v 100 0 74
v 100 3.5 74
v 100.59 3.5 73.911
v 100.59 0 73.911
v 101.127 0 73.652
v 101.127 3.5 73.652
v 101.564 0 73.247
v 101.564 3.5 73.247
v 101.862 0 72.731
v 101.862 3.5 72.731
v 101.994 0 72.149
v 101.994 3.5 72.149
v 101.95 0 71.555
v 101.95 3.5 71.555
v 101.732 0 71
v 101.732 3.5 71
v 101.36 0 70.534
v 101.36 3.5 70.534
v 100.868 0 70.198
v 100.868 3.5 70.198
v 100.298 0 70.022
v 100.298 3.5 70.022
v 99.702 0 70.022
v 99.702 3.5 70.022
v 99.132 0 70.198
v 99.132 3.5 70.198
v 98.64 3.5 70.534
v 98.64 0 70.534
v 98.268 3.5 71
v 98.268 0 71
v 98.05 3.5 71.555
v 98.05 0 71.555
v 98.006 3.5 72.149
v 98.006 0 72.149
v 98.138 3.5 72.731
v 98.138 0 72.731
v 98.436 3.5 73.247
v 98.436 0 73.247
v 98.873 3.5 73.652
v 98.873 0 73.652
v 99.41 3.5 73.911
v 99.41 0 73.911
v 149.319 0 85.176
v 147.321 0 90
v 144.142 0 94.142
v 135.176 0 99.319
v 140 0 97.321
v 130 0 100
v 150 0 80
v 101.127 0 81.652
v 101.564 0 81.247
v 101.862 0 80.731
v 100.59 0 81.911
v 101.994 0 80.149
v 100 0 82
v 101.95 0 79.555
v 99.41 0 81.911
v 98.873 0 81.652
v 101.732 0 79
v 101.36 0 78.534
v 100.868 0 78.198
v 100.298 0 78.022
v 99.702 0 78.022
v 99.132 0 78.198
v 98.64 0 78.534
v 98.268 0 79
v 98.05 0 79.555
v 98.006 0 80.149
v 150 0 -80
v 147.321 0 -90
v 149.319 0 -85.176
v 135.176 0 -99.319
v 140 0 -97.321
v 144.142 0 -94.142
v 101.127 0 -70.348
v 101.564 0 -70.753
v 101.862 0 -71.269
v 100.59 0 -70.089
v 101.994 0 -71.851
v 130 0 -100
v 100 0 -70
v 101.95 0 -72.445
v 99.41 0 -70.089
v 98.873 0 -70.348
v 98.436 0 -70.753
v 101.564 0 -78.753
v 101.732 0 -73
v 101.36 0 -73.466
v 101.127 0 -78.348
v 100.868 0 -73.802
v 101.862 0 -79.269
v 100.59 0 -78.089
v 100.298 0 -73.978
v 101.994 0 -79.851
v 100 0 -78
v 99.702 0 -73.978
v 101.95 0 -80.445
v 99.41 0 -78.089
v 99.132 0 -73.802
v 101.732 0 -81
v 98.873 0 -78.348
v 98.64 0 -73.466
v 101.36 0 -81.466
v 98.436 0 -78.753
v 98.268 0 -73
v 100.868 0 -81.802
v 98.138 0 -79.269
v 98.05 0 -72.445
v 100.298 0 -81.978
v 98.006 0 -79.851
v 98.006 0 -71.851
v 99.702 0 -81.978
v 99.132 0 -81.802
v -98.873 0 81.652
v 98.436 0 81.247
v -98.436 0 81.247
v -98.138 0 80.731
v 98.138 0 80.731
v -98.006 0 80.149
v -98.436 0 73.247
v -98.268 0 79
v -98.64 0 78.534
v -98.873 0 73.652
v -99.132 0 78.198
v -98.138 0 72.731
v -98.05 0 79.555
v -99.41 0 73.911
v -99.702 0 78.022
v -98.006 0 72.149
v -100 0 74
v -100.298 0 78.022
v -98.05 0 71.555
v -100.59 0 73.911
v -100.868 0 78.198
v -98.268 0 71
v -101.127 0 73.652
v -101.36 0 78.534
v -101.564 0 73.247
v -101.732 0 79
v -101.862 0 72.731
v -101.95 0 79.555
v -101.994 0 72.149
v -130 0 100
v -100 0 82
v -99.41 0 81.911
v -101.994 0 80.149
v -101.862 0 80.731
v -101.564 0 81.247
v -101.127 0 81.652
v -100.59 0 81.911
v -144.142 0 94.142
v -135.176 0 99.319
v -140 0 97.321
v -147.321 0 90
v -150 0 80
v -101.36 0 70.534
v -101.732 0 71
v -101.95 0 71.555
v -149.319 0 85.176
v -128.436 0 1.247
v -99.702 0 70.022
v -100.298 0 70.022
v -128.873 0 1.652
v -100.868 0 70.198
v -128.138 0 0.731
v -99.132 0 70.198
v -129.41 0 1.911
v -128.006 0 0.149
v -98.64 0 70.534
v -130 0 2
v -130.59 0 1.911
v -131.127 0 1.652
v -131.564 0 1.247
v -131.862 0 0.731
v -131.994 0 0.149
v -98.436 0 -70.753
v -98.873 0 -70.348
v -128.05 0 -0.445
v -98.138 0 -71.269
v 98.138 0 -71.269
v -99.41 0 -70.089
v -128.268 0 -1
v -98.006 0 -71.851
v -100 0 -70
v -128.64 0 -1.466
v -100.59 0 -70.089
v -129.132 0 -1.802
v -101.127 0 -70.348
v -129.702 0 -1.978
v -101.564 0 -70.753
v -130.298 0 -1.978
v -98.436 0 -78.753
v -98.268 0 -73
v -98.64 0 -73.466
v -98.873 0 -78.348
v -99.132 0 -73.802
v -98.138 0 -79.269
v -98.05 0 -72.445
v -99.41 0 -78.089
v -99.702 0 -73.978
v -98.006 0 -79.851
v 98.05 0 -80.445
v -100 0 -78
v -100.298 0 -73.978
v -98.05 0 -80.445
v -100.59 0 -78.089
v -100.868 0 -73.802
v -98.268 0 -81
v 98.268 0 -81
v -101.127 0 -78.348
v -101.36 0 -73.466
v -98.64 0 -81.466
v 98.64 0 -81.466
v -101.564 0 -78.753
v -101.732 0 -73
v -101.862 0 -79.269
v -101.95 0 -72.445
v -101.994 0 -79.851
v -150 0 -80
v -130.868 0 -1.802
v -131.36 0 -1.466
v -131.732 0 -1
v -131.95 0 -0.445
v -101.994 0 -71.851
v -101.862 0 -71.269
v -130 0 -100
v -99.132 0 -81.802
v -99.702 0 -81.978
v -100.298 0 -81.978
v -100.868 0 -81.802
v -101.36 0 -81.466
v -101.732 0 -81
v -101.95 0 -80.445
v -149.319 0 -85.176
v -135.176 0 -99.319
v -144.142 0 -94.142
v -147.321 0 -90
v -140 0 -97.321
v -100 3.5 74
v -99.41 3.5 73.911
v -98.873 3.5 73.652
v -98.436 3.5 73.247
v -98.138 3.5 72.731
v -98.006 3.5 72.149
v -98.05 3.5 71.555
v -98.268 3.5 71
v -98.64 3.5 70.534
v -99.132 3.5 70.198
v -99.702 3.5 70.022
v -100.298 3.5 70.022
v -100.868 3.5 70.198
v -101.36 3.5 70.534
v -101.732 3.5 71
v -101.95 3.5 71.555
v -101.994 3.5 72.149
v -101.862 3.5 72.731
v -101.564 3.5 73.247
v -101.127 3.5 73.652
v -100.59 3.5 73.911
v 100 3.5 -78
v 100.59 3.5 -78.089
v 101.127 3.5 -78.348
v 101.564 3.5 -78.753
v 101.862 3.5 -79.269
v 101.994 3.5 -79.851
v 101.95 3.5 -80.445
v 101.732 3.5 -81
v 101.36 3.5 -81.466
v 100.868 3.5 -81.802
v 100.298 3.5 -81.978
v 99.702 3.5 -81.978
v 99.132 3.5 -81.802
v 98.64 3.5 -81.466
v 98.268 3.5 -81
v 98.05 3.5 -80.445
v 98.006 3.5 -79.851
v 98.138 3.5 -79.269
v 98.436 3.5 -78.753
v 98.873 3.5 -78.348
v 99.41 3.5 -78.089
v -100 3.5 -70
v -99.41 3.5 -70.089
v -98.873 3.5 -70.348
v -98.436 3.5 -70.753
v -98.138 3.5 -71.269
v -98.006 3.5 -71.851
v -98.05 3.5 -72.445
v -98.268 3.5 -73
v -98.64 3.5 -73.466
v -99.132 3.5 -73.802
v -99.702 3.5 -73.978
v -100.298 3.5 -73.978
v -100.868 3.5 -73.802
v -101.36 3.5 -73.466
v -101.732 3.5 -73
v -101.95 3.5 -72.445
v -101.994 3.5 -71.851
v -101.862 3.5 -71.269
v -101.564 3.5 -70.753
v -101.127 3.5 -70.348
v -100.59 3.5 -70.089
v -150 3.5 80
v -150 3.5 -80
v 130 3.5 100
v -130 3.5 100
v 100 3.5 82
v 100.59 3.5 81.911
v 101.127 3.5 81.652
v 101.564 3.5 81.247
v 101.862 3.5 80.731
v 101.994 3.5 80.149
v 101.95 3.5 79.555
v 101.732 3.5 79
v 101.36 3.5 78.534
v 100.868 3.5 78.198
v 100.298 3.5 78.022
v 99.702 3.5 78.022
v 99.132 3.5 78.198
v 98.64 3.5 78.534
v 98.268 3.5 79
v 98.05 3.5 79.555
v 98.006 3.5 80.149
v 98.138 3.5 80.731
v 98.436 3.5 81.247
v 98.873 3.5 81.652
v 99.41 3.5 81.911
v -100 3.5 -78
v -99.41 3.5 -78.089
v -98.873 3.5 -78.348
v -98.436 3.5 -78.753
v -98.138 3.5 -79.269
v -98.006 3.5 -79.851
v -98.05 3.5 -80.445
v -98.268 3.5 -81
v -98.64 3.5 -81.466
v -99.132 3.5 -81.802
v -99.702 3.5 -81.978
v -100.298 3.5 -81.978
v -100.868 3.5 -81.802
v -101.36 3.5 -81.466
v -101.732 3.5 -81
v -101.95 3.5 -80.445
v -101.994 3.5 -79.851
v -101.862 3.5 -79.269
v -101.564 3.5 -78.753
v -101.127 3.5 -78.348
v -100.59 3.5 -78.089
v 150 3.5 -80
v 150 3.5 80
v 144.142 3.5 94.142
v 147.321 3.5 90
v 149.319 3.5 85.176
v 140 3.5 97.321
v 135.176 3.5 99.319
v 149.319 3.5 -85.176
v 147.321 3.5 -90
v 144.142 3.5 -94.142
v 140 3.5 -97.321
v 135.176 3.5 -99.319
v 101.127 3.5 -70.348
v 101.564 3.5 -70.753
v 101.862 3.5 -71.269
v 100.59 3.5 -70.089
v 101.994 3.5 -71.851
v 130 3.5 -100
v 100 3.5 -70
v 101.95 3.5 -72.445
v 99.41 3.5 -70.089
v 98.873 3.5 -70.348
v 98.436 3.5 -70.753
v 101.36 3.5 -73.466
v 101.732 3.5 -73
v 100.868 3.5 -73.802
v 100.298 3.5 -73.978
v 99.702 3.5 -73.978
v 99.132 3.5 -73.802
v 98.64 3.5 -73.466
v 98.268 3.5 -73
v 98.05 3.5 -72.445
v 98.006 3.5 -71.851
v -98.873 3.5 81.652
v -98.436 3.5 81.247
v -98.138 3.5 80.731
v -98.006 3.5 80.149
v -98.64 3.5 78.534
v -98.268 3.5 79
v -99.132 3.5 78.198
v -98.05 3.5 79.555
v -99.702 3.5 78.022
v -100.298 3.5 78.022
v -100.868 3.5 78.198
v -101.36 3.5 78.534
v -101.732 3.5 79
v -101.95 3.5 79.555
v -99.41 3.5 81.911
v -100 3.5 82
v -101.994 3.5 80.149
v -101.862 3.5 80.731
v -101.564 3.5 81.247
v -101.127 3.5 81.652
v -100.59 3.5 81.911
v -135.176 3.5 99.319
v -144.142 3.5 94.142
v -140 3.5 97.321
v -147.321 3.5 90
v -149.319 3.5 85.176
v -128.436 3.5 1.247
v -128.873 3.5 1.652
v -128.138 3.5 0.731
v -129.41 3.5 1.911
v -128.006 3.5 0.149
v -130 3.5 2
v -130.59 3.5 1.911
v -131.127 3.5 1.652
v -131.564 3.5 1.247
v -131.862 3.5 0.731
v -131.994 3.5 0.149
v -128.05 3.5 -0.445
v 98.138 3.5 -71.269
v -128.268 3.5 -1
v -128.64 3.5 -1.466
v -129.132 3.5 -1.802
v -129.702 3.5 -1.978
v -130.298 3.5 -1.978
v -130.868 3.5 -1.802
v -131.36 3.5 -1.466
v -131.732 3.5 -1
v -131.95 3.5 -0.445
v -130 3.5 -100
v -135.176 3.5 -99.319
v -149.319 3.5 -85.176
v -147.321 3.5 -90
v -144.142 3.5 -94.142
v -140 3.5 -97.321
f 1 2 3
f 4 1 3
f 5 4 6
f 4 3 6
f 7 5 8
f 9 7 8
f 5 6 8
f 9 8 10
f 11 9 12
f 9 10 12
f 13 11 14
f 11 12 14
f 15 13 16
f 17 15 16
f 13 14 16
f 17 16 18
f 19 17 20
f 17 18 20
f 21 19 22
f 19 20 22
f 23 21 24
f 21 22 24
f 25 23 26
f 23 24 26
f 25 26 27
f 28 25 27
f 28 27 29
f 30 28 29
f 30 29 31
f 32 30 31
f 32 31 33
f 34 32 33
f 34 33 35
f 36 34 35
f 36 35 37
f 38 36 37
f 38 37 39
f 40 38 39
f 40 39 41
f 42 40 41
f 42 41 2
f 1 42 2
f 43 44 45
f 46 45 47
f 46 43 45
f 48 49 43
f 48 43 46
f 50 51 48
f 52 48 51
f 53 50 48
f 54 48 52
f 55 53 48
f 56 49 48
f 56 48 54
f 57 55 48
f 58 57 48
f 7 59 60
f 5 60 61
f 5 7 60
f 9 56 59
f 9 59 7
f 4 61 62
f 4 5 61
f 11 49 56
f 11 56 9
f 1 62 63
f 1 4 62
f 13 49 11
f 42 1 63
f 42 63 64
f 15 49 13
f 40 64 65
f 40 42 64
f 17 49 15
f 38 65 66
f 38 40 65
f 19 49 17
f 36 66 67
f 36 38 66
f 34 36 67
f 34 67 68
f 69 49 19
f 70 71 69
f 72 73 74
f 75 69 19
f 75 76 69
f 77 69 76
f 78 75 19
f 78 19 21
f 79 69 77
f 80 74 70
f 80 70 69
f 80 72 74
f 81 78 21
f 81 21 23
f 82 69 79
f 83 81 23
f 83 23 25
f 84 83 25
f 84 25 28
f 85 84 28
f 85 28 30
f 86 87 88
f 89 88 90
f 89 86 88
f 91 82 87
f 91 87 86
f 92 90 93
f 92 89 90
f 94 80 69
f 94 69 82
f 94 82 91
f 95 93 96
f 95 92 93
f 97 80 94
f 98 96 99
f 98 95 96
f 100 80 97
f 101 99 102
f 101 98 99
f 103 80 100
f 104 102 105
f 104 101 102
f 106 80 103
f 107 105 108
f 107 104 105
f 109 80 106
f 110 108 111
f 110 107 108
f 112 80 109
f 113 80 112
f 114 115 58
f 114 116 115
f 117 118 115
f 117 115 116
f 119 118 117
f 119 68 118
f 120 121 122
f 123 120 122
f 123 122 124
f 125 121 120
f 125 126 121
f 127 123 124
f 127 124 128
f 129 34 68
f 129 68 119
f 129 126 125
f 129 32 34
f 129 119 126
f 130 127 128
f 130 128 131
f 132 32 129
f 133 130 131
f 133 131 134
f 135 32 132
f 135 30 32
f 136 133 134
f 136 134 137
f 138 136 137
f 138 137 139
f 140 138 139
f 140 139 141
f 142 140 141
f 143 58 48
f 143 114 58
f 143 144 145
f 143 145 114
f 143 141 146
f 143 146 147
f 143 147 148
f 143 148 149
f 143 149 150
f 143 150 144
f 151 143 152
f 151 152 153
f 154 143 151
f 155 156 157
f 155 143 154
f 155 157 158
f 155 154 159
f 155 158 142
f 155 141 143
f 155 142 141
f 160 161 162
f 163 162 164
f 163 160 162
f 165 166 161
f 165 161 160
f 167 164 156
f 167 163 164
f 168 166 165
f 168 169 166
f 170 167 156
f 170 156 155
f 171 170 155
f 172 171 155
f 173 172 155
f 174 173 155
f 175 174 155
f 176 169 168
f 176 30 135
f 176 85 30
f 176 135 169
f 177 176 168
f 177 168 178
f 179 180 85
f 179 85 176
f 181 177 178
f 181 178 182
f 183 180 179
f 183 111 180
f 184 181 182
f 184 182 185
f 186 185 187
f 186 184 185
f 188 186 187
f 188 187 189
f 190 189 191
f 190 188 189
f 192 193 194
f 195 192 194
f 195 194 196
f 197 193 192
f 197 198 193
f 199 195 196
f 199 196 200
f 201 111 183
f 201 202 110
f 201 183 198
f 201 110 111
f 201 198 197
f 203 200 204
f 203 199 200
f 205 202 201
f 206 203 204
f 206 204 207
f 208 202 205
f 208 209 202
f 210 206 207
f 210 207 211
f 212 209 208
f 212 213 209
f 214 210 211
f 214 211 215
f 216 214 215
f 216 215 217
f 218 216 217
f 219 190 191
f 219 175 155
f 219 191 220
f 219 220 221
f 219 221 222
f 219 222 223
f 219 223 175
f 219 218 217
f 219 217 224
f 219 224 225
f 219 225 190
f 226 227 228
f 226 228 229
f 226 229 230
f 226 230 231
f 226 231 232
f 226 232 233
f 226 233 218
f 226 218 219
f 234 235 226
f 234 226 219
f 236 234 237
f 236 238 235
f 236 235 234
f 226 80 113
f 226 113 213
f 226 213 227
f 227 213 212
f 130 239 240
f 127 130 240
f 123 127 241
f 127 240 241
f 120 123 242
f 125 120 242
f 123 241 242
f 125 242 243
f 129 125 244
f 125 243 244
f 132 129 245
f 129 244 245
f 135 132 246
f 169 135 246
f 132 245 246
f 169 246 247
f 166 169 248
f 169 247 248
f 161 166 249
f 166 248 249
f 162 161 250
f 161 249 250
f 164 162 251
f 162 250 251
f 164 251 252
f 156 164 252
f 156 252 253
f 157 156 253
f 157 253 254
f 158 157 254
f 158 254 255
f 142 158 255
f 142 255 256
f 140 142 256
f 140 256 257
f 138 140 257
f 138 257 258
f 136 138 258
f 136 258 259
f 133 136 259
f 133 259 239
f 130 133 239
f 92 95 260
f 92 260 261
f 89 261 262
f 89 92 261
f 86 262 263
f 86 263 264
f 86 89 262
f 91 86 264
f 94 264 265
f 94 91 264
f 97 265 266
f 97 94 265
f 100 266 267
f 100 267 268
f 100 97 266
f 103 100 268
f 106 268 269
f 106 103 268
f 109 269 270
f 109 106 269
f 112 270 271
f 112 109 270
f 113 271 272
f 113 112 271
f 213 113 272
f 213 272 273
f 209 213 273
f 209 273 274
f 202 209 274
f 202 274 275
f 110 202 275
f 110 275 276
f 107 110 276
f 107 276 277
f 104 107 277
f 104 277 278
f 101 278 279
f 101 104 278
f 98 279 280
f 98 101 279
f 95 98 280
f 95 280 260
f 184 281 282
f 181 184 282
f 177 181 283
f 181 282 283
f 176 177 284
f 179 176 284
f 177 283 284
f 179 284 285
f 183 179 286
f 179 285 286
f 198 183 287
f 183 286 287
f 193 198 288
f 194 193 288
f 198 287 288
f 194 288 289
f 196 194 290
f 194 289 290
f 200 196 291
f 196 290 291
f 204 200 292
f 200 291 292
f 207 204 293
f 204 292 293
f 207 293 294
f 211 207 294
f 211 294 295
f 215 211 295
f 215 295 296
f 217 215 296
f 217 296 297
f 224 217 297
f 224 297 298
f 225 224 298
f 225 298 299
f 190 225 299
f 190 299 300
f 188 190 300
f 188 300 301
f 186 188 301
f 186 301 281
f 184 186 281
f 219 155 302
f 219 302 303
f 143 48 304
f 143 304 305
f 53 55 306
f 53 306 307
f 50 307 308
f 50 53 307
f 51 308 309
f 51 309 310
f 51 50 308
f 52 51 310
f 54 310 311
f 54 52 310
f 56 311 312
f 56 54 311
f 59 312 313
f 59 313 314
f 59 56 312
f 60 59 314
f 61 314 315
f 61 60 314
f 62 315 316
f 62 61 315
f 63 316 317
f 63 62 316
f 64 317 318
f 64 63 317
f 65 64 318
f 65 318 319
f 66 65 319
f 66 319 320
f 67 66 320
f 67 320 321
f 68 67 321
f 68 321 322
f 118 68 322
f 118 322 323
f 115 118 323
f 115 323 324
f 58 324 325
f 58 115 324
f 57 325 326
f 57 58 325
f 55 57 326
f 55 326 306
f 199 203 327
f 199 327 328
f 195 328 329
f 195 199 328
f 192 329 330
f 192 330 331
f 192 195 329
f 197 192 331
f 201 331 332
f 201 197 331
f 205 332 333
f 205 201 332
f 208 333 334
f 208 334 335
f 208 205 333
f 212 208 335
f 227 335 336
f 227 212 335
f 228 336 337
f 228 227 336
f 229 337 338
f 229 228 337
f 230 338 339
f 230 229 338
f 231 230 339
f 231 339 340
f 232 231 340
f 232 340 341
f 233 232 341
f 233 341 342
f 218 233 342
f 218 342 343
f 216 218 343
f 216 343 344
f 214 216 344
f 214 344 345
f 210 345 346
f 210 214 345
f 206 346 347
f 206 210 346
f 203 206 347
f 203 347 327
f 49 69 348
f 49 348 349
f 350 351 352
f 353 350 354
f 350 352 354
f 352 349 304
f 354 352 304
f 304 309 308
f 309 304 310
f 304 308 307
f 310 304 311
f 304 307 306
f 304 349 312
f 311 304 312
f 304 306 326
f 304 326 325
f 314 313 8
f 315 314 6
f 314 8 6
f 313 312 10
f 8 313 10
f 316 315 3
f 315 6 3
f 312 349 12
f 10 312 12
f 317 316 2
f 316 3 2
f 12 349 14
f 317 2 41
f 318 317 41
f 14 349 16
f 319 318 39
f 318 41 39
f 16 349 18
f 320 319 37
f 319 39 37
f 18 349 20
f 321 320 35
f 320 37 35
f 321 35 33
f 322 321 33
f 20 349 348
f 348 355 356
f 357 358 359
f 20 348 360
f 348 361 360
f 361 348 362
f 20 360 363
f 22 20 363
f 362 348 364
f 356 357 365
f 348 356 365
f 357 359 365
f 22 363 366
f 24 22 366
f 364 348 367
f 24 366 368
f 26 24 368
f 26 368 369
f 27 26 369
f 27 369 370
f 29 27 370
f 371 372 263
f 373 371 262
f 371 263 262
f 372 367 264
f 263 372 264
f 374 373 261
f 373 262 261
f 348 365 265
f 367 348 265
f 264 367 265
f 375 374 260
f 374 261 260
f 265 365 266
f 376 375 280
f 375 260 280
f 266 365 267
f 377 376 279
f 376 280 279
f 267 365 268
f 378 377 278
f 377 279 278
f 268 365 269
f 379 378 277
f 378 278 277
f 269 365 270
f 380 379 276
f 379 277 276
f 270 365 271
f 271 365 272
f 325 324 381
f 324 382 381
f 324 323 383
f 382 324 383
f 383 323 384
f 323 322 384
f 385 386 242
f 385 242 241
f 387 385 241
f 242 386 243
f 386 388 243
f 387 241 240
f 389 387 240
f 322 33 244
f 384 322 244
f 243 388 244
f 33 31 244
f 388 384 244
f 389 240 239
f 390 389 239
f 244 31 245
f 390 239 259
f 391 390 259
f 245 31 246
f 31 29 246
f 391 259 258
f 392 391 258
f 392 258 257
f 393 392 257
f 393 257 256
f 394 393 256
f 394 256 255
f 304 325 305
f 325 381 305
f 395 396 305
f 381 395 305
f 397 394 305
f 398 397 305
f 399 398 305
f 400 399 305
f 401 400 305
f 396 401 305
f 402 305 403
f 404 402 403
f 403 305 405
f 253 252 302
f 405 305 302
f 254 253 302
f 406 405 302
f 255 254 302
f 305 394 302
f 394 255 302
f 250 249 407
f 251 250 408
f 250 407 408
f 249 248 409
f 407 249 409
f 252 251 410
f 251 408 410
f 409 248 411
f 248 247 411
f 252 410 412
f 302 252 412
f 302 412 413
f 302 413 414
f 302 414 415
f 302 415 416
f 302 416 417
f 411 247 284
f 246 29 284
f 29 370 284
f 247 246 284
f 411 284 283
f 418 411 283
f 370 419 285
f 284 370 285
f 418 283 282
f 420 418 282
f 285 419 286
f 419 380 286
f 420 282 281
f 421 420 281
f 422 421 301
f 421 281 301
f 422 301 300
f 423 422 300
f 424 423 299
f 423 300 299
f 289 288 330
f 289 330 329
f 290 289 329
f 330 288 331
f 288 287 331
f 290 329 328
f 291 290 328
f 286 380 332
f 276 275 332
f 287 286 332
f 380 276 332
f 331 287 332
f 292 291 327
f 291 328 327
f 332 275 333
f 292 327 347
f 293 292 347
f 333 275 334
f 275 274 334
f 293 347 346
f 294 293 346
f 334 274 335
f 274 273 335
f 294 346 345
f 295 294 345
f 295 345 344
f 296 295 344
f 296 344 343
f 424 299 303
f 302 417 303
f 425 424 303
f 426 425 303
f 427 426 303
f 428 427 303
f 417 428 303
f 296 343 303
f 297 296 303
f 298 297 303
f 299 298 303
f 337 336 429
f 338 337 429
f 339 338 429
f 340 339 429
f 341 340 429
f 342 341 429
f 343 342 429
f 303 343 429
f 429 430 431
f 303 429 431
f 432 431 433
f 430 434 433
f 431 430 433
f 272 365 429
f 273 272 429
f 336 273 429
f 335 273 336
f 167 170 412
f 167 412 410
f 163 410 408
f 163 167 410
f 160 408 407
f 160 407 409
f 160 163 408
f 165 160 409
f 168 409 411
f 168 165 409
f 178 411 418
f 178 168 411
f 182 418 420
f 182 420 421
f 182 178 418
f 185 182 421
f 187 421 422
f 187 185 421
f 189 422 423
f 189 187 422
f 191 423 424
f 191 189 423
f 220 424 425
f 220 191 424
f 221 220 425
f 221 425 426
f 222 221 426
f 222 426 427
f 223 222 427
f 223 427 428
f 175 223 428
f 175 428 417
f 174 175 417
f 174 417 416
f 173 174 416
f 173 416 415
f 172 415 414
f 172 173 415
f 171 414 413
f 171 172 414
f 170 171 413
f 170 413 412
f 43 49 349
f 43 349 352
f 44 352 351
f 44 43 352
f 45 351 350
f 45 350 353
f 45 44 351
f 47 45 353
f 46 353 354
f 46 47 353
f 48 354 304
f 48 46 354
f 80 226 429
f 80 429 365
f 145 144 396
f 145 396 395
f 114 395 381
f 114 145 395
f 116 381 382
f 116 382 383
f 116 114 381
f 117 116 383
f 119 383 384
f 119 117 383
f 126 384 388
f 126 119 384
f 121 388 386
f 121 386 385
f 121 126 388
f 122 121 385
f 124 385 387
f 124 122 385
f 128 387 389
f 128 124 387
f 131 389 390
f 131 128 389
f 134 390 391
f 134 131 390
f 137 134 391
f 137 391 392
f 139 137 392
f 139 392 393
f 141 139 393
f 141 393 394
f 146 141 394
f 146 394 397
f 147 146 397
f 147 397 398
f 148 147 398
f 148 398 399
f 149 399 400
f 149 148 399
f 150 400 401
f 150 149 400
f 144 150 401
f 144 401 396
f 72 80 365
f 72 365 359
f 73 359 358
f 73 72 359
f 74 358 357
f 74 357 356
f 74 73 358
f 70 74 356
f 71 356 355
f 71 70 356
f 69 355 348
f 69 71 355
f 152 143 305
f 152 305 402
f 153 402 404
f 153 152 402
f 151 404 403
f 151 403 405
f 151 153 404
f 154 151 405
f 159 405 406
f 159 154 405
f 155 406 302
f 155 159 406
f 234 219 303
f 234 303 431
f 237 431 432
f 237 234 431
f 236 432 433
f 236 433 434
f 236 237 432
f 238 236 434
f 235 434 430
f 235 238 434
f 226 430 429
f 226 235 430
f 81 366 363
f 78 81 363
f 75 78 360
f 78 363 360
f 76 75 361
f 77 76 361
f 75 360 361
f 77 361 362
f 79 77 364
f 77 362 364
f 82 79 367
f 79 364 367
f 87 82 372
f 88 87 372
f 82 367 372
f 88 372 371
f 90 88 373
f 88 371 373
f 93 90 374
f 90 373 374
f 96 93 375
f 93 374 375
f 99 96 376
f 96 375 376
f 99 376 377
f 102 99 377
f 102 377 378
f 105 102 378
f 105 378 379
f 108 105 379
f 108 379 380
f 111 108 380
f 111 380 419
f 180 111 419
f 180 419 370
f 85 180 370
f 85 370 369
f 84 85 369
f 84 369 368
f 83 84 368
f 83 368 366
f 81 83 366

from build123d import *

# Parameters (mm, degrees)
SKETCH1_R           = 2
BOSS_EXTRUDE1_DEPTH = 3.5
SKETCH3_R           = 2
CUT_EXTRUDE2_DEPTH  = 10


with BuildPart() as part:
    # Sketch1 → Boss-Extrude1 (new body)
    with BuildSketch(Plane(origin=(0, 0, 0), x_dir=(1, 0, 0), z_dir=(0, 1, 0))):
        with BuildLine():
            Line((130, -100), (-130, -100))
            ThreePointArc((-130, -100), (-144.142135624, -94.142135624), (-150, -80))
            Line((-150, -80), (-150, 80))
            ThreePointArc((-150, 80), (-144.142135624, 94.142135624), (-130, 100))
            Line((-130, 100), (130, 100))
            ThreePointArc((130, 100), (144.142135624, 94.142135624), (150, 80))
            Line((150, 80), (150, -80))
            ThreePointArc((150, -80), (144.142135624, -94.142135624), (130, -100))
        make_face()
        with Locations(Location((-100, 80, 0), (0, 0, 270))):
            Circle(SKETCH1_R, mode=Mode.SUBTRACT)
        with Locations(Location((100, 80, 0), (0, 0, 270))):
            Circle(SKETCH1_R, mode=Mode.SUBTRACT)
        with Locations(Location((100, -80, 0), (0, 0, 270))):
            Circle(SKETCH1_R, mode=Mode.SUBTRACT)
        with Locations(Location((-100, -80, 0), (0, 0, 270))):
            Circle(SKETCH1_R, mode=Mode.SUBTRACT)
        with Locations(Location((-130, 0, 0), (0, 0, 270))):
            Circle(SKETCH1_R, mode=Mode.SUBTRACT)
    extrude(amount=BOSS_EXTRUDE1_DEPTH)

    # Sketch3 → Cut-Extrude2 (cut)
    with BuildSketch(Plane(origin=(0, 3.5, 0), x_dir=(1, 0, 0), z_dir=(0, 1, 0))):
        with Locations(Location((-100, 72, 0), (0, 0, 270))):
            Circle(SKETCH3_R)
        with Locations(Location((-100, -72, 0), (0, 0, 270))):
            Circle(SKETCH3_R)
        with Locations(Location((100, -72, 0), (0, 0, 270))):
            Circle(SKETCH3_R)
        with Locations(Location((100, 72, 0), (0, 0, 270))):
            Circle(SKETCH3_R)
    extrude(amount=-CUT_EXTRUDE2_DEPTH, mode=Mode.SUBTRACT)


solid = part.part
